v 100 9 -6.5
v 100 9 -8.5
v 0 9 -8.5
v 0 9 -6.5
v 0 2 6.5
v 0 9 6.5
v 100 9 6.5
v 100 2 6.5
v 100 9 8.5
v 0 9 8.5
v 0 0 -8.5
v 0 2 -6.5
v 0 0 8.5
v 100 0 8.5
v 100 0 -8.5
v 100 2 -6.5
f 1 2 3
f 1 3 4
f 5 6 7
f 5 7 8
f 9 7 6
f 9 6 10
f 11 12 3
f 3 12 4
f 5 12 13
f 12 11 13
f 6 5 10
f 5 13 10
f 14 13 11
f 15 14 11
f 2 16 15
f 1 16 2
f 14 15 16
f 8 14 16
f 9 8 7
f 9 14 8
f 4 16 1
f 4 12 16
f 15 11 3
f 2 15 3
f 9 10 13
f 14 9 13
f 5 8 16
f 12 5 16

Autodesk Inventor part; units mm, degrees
ref_plane "YZ Plane" through (0, 0, 0) normal (1, 0, 0) x (0, 1, 0)
ref_plane "XZ Plane" through (0, 0, 0) normal (0, 1, 0) x (-1, 0, 0)
ref_plane "XY Plane" through (0, 0, 0) normal (0, 0, 1) x (1, 0, 0)
sketch "Sketch1" plane through (0, 0, 0) normal (1, 0, 0) x (0, 1, 0)
  line L0 (9, 8.5) -> (0, 8.5)
  line L1 (0, 8.5) -> (0, -8.5)
  line L2 (0, -8.5) -> (9, -8.5)
  line L3 (9, -8.5) -> (9, -6.5)
  line L4 (9, 6.5) -> (2, 6.5)
  line L5 (2, 6.5) -> (2, -6.5)
  line L6 (2, -6.5) -> (9, -6.5)
  line L7 (9, -6.5) -> (9, 6.5) construction
  line L8 (9, 6.5) -> (9, 8.5)
  line L9 (9, -6.5) -> (9, 6.5) construction
  point P0 (0, 0)
  point P1 (0, 0)
  dimension "d0" = 9
  dimension "d1" = 17
  dimension "d3" = 13
  dimension "d4" = 2
  dimension "d5" = 2
  dimension "d6" = 2
extrude "Extrusion1" add sketch "Sketch1" along normal blind 100
equation "\"d5\" = d6"
properties part number "Channel"
